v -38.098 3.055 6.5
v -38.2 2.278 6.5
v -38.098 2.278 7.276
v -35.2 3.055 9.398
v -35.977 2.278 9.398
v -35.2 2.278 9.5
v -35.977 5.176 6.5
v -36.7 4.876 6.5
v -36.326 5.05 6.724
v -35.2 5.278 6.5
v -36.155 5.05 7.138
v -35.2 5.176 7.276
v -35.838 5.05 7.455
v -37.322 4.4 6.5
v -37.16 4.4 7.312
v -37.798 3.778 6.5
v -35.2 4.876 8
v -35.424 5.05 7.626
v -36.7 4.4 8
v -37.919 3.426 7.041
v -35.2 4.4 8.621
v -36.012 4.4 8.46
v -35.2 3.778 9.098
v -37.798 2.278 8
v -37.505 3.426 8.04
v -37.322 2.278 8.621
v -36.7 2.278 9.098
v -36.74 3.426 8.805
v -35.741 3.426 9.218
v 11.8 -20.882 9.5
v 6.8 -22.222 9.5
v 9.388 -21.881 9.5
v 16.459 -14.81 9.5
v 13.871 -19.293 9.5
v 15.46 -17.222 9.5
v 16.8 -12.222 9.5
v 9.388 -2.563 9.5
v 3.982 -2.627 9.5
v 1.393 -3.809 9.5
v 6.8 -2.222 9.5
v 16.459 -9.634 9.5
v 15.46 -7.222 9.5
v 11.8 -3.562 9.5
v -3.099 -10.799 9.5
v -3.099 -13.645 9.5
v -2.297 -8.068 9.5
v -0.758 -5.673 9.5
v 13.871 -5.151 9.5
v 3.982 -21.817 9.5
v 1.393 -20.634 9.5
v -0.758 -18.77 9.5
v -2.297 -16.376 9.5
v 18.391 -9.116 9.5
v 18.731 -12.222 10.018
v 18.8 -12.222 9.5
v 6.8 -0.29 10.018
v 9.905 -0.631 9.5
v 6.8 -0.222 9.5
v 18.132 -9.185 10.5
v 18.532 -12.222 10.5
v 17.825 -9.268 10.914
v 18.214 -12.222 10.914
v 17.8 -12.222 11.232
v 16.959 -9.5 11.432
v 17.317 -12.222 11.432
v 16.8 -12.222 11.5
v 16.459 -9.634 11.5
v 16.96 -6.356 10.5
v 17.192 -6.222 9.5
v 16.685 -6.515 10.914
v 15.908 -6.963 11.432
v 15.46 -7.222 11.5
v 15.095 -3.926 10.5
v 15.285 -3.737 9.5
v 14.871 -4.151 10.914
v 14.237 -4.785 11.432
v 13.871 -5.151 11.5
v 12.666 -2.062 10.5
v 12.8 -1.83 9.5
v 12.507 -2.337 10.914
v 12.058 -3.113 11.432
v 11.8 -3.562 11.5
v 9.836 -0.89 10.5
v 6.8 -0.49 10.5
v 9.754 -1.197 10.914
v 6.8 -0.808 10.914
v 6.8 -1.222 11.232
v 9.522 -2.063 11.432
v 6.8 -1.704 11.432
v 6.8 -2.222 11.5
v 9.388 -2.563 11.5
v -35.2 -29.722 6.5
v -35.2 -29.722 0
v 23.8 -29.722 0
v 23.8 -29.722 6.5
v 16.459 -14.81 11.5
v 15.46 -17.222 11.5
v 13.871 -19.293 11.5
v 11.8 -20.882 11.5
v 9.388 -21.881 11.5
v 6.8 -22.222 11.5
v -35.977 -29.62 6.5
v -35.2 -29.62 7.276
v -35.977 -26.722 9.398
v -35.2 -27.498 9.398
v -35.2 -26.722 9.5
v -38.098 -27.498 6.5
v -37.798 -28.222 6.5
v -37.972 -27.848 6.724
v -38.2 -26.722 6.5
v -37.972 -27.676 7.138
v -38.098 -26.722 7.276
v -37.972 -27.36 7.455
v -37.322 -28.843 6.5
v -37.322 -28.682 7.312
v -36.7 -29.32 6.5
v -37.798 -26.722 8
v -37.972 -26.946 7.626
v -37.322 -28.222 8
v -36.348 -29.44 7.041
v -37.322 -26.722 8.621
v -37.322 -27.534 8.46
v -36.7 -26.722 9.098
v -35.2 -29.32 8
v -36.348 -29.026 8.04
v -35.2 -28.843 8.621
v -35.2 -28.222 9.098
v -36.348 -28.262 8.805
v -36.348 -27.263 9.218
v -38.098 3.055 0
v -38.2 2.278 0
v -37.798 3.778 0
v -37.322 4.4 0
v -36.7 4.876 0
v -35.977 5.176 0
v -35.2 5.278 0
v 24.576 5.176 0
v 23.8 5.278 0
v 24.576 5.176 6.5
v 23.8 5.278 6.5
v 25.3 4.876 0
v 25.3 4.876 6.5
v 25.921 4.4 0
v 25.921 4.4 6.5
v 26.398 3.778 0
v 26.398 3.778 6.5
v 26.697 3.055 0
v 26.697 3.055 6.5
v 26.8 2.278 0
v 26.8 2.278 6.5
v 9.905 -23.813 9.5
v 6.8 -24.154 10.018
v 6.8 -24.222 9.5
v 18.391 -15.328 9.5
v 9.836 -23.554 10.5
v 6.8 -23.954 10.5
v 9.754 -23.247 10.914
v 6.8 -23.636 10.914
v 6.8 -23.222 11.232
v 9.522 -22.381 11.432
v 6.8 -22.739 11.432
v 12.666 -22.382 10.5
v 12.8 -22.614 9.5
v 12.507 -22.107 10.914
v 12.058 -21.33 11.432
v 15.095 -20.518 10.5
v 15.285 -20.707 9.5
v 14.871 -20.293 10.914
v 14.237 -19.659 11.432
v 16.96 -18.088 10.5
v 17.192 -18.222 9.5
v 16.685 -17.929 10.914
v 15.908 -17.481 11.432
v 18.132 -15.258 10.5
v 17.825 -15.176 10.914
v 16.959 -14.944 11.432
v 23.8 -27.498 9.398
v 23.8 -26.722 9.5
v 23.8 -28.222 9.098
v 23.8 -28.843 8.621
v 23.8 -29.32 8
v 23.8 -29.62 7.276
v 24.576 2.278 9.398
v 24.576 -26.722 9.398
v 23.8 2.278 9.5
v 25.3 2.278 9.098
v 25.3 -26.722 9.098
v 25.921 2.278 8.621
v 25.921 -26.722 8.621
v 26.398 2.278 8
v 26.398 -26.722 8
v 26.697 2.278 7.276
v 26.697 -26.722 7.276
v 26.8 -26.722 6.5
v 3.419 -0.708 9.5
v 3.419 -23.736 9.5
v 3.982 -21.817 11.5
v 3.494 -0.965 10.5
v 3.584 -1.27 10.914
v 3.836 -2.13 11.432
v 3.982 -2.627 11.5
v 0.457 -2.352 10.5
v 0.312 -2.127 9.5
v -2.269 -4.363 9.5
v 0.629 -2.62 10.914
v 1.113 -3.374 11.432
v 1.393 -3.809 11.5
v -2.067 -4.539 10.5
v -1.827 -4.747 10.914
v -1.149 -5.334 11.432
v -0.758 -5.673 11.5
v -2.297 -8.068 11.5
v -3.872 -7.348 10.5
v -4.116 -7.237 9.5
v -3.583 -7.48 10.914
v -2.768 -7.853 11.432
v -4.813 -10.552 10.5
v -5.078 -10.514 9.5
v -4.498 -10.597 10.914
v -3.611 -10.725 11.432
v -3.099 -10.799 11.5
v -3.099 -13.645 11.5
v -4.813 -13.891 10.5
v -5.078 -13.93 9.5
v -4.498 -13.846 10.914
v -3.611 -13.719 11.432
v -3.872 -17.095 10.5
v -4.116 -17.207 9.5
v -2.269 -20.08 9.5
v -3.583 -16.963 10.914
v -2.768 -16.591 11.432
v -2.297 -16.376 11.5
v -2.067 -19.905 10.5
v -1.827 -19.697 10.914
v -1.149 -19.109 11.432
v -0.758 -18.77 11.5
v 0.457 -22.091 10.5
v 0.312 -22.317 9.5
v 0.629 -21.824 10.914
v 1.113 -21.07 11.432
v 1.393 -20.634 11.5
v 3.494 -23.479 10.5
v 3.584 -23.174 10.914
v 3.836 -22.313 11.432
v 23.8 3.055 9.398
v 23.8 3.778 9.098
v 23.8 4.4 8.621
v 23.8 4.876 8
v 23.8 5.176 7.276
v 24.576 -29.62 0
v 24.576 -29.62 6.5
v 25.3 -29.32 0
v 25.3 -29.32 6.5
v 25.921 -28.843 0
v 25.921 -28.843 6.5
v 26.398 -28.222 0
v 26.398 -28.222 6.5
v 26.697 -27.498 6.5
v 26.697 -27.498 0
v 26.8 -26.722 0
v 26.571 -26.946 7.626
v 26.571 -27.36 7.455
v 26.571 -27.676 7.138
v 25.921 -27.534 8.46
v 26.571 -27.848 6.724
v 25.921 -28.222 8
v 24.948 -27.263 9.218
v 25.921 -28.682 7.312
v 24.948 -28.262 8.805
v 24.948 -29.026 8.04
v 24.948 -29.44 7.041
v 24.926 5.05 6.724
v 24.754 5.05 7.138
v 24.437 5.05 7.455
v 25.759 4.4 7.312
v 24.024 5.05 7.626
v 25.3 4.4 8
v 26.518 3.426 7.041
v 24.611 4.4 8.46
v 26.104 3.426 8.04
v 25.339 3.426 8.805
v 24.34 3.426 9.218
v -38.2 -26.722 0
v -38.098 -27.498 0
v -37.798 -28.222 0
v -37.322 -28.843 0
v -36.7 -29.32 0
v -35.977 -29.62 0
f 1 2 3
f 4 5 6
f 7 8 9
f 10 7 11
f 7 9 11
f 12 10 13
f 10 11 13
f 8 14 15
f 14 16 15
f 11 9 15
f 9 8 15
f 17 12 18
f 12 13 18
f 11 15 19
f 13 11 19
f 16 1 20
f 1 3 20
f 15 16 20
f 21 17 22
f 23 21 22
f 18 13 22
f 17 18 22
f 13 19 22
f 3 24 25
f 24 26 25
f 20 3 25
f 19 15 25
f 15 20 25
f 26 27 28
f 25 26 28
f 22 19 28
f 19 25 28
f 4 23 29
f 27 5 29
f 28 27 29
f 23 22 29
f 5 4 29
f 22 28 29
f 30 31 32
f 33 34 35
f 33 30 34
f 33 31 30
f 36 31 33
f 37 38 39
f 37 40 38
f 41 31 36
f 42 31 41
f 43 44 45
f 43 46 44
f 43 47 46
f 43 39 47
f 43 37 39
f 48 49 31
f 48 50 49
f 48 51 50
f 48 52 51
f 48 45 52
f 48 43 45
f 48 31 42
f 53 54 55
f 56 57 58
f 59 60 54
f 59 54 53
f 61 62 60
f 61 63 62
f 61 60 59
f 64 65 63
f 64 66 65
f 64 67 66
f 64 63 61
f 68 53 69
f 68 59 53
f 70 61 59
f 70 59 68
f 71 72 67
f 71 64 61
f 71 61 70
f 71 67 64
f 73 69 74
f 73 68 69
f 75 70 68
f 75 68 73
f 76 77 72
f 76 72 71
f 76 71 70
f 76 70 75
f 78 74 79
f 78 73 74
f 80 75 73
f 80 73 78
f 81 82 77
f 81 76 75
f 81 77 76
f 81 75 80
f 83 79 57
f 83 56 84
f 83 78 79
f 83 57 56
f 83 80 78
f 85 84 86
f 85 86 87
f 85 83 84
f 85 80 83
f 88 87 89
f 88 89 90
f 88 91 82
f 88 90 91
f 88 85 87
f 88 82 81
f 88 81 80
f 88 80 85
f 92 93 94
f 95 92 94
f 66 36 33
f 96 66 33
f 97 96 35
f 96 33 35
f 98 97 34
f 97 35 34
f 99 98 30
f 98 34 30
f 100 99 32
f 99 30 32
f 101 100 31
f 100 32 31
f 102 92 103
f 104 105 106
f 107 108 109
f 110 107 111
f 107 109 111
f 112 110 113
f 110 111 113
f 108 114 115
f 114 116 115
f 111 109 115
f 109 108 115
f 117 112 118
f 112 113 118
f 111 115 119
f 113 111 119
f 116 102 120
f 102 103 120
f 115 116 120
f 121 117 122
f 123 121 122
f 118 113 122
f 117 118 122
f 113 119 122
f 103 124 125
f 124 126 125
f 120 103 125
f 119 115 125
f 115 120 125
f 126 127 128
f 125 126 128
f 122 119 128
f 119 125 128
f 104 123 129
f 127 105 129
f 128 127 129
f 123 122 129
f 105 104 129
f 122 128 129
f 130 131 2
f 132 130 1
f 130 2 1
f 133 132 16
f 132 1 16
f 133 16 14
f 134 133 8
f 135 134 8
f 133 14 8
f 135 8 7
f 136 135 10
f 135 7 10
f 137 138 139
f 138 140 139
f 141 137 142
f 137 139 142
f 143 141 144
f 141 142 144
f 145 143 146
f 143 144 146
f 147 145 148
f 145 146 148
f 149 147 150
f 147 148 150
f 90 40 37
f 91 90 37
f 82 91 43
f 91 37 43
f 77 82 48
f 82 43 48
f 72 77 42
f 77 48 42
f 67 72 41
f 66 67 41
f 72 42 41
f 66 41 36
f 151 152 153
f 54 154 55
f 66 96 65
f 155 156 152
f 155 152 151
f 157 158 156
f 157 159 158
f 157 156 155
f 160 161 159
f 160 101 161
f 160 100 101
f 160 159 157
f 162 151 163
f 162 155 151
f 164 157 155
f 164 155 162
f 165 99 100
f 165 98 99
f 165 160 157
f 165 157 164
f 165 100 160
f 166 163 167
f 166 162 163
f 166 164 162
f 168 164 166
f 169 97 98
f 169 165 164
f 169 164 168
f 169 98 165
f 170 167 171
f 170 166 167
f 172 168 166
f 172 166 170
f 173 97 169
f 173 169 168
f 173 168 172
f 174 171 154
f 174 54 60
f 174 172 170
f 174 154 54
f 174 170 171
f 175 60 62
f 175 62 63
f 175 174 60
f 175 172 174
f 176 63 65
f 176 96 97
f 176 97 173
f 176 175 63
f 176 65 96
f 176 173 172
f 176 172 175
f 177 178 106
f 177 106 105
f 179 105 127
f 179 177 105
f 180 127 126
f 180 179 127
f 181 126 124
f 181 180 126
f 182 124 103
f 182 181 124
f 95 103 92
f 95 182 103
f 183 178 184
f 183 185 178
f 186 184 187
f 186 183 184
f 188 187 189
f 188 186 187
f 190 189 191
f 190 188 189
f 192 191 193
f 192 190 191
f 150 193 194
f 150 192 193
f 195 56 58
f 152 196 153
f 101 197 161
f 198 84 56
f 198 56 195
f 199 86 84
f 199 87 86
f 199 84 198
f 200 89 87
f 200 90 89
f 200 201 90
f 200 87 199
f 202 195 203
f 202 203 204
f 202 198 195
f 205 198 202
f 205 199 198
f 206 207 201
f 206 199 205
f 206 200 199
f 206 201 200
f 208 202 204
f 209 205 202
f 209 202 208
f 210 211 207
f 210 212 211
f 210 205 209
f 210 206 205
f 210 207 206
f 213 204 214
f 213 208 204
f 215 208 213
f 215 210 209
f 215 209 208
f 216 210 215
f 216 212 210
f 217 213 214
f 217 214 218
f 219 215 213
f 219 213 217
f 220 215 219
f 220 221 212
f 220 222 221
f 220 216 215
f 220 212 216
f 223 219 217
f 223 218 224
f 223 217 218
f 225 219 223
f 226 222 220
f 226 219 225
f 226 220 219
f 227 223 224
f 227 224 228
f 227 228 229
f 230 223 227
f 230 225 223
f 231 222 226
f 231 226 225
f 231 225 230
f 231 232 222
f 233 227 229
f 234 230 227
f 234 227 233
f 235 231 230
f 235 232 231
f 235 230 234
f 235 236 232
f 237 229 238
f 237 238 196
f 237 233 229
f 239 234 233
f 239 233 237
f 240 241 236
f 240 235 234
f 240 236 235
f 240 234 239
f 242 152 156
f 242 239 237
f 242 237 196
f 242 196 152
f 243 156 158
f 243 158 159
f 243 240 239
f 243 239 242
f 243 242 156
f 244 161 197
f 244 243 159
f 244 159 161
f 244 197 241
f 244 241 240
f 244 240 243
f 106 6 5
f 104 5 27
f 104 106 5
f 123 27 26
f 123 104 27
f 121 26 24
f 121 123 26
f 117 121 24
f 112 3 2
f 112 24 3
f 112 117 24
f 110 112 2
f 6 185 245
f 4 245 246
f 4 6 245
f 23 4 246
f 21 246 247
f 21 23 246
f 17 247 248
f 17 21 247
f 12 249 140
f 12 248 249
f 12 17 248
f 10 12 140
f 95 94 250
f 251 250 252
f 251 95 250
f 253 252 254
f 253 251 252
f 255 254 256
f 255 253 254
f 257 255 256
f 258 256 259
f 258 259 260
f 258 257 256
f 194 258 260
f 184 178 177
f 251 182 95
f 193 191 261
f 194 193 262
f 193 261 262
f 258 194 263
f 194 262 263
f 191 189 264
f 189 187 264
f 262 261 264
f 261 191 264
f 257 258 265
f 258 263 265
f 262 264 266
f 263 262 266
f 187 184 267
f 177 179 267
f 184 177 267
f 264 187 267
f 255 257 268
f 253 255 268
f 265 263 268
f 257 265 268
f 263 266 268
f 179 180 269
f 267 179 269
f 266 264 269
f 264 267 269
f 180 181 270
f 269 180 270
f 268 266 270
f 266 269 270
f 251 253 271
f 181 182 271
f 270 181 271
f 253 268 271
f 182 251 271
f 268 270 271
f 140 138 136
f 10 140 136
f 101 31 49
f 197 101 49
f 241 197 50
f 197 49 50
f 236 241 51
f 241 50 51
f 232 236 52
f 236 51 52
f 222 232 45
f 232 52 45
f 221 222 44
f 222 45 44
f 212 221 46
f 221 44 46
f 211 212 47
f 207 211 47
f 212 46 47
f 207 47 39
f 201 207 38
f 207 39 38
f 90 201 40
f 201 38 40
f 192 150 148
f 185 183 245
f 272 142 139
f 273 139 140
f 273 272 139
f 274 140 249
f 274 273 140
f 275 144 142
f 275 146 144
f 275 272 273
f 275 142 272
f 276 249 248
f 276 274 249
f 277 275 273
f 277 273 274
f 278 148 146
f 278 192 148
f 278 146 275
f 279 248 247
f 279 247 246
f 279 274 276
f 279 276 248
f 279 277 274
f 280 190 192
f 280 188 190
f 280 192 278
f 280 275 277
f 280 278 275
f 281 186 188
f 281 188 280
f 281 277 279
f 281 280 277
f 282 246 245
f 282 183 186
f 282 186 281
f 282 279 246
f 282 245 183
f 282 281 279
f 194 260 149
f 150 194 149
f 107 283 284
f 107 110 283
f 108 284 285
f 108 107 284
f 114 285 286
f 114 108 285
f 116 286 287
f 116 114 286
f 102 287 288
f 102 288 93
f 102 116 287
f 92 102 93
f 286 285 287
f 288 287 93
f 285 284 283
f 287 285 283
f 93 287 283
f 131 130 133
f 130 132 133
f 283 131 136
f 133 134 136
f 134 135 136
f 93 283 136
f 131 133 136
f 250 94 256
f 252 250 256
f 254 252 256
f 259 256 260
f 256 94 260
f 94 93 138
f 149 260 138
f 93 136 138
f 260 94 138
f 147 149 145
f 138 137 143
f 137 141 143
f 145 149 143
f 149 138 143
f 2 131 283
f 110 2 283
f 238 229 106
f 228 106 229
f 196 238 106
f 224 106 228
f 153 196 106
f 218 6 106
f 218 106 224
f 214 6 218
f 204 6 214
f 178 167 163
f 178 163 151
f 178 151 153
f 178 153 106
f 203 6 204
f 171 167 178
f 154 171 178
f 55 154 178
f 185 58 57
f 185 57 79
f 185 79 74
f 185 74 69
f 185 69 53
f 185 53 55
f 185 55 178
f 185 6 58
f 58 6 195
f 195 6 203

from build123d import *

# Parameters (mm, degrees)
F1_DEPTH = 9.5
F2_DEPTH = 11.5
F3_R     = 1.99999
F4_R     = 3


# Not quite as in the source:
# - a fillet or chamfer is up to 0.001 mm smaller than in the source, because OpenCascade refuses the exact size


with BuildPart() as f1:
    # F0 (on Top) → F1 (new body)
    with BuildSketch(Plane.XY):
        with BuildLine():
            Line((6.7996287718, 5.2781800885), (-38.2003712282, 5.2781800885))
            Line((-38.2003712282, 5.2781800885), (-38.2003712282, -29.7218199115))
            Line((-38.2003712282, -29.7218199115), (6.7996287718, -29.7218199115))
            Line((6.7996287718, -29.7218199115), (6.7996287718, -24.2218199115))
            ThreePointArc((6.7996287718, -24.2218199115), (-5.2003712282, -12.2218199115), (6.7996287718, -0.2218199115))
            Line((6.7996287718, -0.2218199115), (6.7996287718, 5.2781800885))
        make_face()
        with BuildLine():
            Line((26.7996287718, 5.2781800885), (6.7996287718, 5.2781800885))
            Line((6.7996287718, 5.2781800885), (6.7996287718, -0.2218199115))
            ThreePointArc((6.7996287718, -0.2218199115), (15.2849101461, -3.7365385373), (18.7996287718, -12.2218199115))
            Line((18.7996287718, -12.2218199115), (26.7996287718, -12.2218199115))
            Line((26.7996287718, -12.2218199115), (26.7996287718, 5.2781800885))
        make_face()
        with BuildLine():
            Line((6.7996287718, -24.2218199115), (6.7996287718, -29.7218199115))
            Line((6.7996287718, -29.7218199115), (26.7996287718, -29.7218199115))
            Line((26.7996287718, -29.7218199115), (26.7996287718, -12.2218199115))
            Line((26.7996287718, -12.2218199115), (18.7996287718, -12.2218199115))
            ThreePointArc((18.7996287718, -12.2218199115), (15.2849101461, -20.7071012858), (6.7996287718, -24.2218199115))
        make_face()
        with BuildLine():
            ThreePointArc((6.7996287718, -24.2218199115), (15.2849101461, -20.7071012858), (18.7996287718, -12.2218199115))
            Line((18.7996287718, -12.2218199115), (16.7996287718, -12.2218199115))
            ThreePointArc((16.7996287718, -12.2218199115), (13.8706965837, -19.2928877234), (6.7996287718, -22.2218199115))
            Line((6.7996287718, -22.2218199115), (6.7996287718, -24.2218199115))
        make_face()
        with BuildLine():
            ThreePointArc((18.7996287718, -12.2218199115), (15.2849101461, -3.7365385373), (6.7996287718, -0.2218199115))
            Line((6.7996287718, -0.2218199115), (6.7996287718, -2.2218199115))
            ThreePointArc((6.7996287718, -2.2218199115), (13.8706965837, -5.1507520997), (16.7996287718, -12.2218199115))
            Line((16.7996287718, -12.2218199115), (18.7996287718, -12.2218199115))
        make_face()
        with BuildLine():
            Line((6.7996287718, -2.2218199115), (6.7996287718, -0.2218199115))
            ThreePointArc((6.7996287718, -0.2218199115), (-5.2003712282, -12.2218199115), (6.7996287718, -24.2218199115))
            Line((6.7996287718, -24.2218199115), (6.7996287718, -22.2218199115))
            ThreePointArc((6.7996287718, -22.2218199115), (-3.2003712282, -12.2218199115), (6.7996287718, -2.2218199115))
        make_face()
        with BuildLine():
            Line((6.7996287718, -22.2218199115), (6.7996287718, -2.2218199115))
            ThreePointArc((6.7996287718, -2.2218199115), (-3.2003712282, -12.2218199115), (6.7996287718, -22.2218199115))
        make_face()
        with BuildLine():
            ThreePointArc((16.7996287718, -12.2218199115), (13.8706965837, -5.1507520997), (6.7996287718, -2.2218199115))
            Line((6.7996287718, -2.2218199115), (6.7996287718, -22.2218199115))
            ThreePointArc((6.7996287718, -22.2218199115), (13.8706965837, -19.2928877234), (16.7996287718, -12.2218199115))
        make_face()
    extrude(amount=F1_DEPTH)

    # F0 (on Top) → F2 (join)
    with BuildSketch(Plane.XY):
        with BuildLine():
            ThreePointArc((6.7996287718, -24.2218199115), (15.2849101461, -20.7071012858), (18.7996287718, -12.2218199115))
            Line((18.7996287718, -12.2218199115), (16.7996287718, -12.2218199115))
            ThreePointArc((16.7996287718, -12.2218199115), (13.8706965837, -19.2928877234), (6.7996287718, -22.2218199115))
            Line((6.7996287718, -22.2218199115), (6.7996287718, -24.2218199115))
        make_face()
        with BuildLine():
            ThreePointArc((18.7996287718, -12.2218199115), (15.2849101461, -3.7365385373), (6.7996287718, -0.2218199115))
            Line((6.7996287718, -0.2218199115), (6.7996287718, -2.2218199115))
            ThreePointArc((6.7996287718, -2.2218199115), (13.8706965837, -5.1507520997), (16.7996287718, -12.2218199115))
            Line((16.7996287718, -12.2218199115), (18.7996287718, -12.2218199115))
        make_face()
        with BuildLine():
            Line((6.7996287718, -2.2218199115), (6.7996287718, -0.2218199115))
            ThreePointArc((6.7996287718, -0.2218199115), (-5.2003712282, -12.2218199115), (6.7996287718, -24.2218199115))
            Line((6.7996287718, -24.2218199115), (6.7996287718, -22.2218199115))
            ThreePointArc((6.7996287718, -22.2218199115), (-3.2003712282, -12.2218199115), (6.7996287718, -2.2218199115))
        make_face()
    extrude(amount=F2_DEPTH)

    # F3 (radius 2 in the source; OpenCascade refuses exactly that, so slightly less here)
    f3_edges = [f1.edges().sort_by_distance(p)[0] for p in [
        (6.799629, -24.22182, 11.5),
    ]]
    fillet(f3_edges, radius=F3_R)

    # F4
    f4_edges = [f1.edges().sort_by_distance(p)[0] for p in [
        (-5.700371, -29.72182, 9.5),
        (26.799629, -12.22182, 9.5),
        (26.799629, -29.72182, 4.75),
        (-38.200371, -29.72182, 4.75),
        (-38.200371, -12.22182, 9.5),
        (-38.200371, 5.27818, 4.75),
        (26.799629, 5.27818, 4.75),
        (-5.700371, 5.27818, 9.5),
    ]]
    fillet(f4_edges, radius=F4_R)


solid = f1.part
